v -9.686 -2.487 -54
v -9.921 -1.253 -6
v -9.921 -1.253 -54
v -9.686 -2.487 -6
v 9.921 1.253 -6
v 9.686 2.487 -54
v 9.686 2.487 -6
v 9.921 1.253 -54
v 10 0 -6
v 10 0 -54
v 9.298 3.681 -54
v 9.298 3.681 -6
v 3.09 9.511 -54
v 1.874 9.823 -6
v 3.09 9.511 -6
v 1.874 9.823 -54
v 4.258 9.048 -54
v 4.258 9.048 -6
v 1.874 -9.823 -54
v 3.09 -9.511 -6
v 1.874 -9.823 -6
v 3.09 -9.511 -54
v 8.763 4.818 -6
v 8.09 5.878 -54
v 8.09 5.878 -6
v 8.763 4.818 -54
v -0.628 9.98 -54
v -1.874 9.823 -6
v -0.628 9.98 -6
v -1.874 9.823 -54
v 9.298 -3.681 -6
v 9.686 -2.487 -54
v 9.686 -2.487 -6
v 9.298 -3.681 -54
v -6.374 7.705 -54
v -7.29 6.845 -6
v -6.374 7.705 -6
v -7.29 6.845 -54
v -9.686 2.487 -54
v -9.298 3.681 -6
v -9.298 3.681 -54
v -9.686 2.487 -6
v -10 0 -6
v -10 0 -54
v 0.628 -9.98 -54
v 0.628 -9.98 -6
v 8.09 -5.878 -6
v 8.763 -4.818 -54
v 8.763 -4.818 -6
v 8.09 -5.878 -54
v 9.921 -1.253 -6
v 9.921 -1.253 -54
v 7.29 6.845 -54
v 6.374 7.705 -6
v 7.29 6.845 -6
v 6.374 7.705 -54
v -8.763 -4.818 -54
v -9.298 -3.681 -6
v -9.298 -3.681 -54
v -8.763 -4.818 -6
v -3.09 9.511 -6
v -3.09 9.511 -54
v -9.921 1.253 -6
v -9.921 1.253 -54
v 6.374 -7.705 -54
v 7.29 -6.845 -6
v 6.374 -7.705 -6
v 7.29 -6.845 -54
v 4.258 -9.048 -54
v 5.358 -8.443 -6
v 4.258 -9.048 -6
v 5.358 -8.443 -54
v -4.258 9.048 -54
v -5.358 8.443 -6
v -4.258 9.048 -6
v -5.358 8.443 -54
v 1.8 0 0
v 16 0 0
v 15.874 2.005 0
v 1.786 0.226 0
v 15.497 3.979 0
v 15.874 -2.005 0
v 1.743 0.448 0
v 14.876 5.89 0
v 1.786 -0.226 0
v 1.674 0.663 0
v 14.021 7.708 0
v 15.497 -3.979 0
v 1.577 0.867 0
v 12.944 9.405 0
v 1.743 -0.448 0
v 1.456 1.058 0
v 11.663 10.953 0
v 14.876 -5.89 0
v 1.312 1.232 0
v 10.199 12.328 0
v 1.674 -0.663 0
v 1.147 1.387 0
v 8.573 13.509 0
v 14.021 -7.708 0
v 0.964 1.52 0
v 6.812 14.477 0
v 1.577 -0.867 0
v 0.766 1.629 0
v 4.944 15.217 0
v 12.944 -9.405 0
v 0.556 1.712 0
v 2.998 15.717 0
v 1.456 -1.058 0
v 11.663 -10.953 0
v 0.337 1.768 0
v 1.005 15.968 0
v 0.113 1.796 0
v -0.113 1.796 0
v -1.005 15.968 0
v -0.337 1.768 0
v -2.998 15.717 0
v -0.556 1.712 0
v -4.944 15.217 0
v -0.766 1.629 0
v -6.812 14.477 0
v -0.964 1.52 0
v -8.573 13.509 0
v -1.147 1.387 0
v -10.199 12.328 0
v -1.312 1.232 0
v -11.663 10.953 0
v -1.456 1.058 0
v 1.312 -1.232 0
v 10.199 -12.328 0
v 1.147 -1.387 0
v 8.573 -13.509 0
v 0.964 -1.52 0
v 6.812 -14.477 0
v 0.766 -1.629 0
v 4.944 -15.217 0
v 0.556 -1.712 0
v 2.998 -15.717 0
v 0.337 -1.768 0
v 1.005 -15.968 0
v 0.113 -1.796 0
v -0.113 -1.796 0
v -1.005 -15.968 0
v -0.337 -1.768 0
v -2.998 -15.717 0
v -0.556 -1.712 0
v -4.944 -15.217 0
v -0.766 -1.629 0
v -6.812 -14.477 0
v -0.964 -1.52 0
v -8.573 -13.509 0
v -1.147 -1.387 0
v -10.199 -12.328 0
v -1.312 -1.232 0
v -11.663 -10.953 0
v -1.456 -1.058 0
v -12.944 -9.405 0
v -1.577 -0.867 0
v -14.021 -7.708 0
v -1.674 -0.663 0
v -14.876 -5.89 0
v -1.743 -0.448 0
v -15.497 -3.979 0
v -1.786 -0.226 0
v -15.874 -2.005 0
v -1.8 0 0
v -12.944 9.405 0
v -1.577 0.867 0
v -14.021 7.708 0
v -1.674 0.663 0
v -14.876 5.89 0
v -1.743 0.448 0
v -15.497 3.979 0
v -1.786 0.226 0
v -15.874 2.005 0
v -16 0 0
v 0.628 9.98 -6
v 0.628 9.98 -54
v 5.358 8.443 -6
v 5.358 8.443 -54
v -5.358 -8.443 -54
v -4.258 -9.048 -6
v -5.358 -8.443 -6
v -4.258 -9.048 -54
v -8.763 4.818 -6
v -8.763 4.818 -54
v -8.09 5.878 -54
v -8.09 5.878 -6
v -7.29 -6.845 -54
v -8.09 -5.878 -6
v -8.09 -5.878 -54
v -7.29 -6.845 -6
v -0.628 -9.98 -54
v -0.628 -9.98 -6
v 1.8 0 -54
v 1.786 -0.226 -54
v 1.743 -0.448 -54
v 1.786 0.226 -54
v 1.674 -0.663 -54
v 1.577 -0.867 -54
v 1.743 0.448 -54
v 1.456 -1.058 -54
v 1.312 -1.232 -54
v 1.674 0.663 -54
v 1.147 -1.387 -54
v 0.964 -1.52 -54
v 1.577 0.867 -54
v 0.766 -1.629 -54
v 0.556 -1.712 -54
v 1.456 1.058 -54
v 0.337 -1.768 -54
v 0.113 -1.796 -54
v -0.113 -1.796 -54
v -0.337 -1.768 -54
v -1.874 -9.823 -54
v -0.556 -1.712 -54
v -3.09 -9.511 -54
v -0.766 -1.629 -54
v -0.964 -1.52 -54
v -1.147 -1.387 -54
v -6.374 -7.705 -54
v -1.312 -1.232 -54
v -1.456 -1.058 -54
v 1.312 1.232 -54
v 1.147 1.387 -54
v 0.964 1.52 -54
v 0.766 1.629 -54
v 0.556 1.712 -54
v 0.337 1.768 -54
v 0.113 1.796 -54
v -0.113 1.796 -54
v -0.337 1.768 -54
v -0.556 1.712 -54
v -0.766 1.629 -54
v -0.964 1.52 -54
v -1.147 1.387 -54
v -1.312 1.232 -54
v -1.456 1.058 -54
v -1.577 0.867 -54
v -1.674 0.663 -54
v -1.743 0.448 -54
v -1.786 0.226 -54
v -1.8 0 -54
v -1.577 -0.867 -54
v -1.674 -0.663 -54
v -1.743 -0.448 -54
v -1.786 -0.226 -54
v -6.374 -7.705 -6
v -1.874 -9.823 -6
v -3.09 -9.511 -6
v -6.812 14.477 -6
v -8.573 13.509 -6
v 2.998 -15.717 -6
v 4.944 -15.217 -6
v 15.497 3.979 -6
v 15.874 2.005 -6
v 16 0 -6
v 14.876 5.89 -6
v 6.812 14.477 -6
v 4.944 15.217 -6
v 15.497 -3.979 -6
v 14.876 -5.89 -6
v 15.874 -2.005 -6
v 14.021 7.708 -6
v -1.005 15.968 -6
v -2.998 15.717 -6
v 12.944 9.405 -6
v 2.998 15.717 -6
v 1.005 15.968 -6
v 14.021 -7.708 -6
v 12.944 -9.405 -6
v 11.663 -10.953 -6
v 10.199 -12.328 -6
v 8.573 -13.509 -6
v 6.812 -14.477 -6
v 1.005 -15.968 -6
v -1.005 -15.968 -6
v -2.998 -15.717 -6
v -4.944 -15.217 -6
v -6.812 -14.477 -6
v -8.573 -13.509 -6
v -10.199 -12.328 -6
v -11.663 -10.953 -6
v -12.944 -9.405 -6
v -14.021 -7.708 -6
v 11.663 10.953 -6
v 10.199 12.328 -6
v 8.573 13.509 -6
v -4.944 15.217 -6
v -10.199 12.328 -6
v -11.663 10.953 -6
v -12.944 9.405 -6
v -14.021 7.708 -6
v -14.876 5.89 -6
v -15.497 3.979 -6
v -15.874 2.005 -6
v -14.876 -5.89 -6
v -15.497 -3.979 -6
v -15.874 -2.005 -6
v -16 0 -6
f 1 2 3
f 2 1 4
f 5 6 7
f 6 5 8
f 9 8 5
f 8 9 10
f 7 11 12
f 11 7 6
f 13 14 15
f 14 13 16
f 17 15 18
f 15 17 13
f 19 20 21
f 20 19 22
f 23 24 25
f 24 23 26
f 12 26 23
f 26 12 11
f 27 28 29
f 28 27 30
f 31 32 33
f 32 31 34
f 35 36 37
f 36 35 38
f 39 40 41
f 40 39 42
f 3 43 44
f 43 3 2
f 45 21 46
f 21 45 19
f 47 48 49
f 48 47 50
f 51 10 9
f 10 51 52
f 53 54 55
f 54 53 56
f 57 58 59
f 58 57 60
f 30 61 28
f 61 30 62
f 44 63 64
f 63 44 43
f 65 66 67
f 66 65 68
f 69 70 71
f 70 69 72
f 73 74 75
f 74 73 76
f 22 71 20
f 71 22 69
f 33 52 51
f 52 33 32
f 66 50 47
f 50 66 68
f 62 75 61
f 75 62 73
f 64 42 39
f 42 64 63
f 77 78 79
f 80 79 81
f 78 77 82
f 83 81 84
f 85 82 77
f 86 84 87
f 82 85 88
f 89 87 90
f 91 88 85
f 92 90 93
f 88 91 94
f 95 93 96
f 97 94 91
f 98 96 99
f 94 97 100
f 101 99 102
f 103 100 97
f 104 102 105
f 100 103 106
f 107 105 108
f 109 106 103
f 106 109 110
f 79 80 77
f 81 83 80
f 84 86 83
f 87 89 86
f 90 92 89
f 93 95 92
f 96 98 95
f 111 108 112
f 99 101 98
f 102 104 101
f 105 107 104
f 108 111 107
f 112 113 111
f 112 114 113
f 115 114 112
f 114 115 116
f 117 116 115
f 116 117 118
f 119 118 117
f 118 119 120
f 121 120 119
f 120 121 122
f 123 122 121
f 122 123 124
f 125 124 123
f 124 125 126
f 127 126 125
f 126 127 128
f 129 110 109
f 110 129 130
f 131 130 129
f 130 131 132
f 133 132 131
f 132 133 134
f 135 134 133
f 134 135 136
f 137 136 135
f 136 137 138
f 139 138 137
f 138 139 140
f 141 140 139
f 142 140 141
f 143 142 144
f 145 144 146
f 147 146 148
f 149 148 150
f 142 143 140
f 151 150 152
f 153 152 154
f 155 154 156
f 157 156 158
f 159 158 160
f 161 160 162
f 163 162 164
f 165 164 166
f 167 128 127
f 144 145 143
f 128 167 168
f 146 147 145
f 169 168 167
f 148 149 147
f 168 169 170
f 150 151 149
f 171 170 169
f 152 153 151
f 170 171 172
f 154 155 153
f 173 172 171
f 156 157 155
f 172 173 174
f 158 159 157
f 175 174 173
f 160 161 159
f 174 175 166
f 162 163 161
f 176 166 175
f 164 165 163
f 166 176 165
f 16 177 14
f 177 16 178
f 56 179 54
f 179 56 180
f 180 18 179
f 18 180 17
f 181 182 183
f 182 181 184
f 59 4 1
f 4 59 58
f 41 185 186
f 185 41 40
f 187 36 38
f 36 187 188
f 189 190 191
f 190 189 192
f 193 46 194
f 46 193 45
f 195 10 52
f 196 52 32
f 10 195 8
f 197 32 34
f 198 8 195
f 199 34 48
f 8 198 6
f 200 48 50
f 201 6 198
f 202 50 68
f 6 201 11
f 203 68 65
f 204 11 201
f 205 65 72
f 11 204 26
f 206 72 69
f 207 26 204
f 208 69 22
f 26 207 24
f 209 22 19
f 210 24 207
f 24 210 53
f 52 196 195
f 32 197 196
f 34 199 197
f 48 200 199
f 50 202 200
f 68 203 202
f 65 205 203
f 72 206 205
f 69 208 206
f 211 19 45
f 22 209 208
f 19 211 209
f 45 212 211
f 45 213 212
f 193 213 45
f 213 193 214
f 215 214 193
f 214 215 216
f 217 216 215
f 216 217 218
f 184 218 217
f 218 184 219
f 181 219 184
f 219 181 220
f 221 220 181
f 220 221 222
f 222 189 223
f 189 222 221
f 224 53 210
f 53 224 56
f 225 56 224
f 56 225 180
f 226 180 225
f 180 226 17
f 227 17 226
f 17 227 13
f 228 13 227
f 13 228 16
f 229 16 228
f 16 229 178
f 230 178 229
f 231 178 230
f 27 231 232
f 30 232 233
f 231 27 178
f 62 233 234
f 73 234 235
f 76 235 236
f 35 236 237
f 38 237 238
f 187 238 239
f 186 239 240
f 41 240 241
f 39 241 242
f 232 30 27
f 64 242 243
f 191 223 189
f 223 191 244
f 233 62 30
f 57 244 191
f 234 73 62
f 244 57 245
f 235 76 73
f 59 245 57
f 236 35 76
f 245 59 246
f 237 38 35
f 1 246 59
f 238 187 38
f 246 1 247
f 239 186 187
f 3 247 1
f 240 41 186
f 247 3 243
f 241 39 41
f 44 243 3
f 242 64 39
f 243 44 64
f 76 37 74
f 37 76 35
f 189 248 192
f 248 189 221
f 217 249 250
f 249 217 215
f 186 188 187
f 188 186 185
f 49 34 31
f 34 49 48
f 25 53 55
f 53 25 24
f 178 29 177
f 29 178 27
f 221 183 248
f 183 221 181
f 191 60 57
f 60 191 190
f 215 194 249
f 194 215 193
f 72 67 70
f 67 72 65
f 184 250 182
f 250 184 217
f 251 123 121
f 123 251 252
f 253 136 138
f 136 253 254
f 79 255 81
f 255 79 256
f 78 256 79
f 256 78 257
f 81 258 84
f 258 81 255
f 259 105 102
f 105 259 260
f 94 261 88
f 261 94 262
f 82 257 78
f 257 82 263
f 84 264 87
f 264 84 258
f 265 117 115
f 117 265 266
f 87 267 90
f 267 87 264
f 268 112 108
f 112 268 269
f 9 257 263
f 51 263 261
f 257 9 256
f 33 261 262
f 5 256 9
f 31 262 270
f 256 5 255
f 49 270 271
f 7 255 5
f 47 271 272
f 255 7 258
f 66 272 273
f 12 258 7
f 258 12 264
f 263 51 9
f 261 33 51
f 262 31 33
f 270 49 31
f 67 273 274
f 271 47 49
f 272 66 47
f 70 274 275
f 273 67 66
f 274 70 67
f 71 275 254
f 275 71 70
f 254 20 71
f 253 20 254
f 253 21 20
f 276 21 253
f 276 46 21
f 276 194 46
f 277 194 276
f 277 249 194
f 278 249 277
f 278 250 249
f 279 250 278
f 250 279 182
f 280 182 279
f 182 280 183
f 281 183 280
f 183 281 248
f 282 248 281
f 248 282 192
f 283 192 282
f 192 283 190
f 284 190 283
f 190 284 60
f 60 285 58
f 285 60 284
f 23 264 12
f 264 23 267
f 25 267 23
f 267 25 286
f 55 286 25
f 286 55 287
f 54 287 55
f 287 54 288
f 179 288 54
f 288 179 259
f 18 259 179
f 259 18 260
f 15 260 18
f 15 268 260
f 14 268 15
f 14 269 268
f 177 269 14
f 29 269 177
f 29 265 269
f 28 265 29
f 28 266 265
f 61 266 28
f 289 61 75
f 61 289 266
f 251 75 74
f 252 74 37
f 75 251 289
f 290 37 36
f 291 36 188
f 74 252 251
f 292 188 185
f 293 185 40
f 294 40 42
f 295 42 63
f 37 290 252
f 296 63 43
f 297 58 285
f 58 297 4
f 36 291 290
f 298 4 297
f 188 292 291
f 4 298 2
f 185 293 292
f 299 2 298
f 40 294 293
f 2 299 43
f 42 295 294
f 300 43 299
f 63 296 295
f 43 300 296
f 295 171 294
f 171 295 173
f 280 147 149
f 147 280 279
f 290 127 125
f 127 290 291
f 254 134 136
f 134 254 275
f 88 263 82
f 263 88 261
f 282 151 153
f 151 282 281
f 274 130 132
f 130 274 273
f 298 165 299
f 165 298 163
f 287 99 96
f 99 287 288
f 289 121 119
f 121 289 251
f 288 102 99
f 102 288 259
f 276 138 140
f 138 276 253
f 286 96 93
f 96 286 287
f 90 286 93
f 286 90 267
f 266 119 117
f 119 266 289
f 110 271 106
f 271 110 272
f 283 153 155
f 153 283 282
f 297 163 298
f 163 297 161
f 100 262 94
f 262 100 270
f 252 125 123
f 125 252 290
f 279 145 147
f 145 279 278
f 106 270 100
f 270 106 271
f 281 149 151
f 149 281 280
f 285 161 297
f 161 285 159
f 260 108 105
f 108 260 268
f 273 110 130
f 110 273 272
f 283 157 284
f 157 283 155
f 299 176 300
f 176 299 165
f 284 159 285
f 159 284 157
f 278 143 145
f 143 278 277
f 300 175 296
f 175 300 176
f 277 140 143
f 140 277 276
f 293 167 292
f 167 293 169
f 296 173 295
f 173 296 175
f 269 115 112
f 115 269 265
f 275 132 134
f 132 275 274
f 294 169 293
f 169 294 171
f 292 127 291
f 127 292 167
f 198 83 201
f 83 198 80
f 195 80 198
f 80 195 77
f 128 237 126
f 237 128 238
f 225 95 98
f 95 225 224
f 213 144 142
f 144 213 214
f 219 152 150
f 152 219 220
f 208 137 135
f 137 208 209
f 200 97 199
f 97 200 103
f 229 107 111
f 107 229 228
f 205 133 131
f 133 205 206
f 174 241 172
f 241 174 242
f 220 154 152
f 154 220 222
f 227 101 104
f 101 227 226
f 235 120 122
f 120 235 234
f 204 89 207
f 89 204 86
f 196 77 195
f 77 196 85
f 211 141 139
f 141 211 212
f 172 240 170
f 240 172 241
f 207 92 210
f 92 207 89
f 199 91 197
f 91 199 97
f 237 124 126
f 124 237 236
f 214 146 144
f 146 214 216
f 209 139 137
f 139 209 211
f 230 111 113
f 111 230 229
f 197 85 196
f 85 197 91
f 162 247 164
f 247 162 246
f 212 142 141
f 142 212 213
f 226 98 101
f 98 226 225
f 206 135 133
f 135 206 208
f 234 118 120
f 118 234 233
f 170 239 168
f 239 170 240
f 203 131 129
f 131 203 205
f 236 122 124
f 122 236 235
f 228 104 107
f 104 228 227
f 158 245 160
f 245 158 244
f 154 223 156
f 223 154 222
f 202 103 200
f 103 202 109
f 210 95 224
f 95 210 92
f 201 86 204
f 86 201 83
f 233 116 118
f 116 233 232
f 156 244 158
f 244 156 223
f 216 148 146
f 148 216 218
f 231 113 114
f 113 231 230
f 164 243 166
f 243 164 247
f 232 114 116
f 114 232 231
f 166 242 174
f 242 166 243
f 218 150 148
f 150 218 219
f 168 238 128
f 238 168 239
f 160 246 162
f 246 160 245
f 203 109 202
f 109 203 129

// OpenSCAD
$fn = 50;


difference() {
	union() {
		translate(v = [0, 0, -54.0000000000]) {
			cylinder(h = 54, r = 10.0000000000);
		}
		translate(v = [0, 0, -6.0000000000]) {
			cylinder(h = 6, r = 16.0000000000);
		}
	}
	union() {
		#translate(v = [0, 0, -54]) {
			cylinder(h = 54, r = 1.8000000000);
		}
	}
}
